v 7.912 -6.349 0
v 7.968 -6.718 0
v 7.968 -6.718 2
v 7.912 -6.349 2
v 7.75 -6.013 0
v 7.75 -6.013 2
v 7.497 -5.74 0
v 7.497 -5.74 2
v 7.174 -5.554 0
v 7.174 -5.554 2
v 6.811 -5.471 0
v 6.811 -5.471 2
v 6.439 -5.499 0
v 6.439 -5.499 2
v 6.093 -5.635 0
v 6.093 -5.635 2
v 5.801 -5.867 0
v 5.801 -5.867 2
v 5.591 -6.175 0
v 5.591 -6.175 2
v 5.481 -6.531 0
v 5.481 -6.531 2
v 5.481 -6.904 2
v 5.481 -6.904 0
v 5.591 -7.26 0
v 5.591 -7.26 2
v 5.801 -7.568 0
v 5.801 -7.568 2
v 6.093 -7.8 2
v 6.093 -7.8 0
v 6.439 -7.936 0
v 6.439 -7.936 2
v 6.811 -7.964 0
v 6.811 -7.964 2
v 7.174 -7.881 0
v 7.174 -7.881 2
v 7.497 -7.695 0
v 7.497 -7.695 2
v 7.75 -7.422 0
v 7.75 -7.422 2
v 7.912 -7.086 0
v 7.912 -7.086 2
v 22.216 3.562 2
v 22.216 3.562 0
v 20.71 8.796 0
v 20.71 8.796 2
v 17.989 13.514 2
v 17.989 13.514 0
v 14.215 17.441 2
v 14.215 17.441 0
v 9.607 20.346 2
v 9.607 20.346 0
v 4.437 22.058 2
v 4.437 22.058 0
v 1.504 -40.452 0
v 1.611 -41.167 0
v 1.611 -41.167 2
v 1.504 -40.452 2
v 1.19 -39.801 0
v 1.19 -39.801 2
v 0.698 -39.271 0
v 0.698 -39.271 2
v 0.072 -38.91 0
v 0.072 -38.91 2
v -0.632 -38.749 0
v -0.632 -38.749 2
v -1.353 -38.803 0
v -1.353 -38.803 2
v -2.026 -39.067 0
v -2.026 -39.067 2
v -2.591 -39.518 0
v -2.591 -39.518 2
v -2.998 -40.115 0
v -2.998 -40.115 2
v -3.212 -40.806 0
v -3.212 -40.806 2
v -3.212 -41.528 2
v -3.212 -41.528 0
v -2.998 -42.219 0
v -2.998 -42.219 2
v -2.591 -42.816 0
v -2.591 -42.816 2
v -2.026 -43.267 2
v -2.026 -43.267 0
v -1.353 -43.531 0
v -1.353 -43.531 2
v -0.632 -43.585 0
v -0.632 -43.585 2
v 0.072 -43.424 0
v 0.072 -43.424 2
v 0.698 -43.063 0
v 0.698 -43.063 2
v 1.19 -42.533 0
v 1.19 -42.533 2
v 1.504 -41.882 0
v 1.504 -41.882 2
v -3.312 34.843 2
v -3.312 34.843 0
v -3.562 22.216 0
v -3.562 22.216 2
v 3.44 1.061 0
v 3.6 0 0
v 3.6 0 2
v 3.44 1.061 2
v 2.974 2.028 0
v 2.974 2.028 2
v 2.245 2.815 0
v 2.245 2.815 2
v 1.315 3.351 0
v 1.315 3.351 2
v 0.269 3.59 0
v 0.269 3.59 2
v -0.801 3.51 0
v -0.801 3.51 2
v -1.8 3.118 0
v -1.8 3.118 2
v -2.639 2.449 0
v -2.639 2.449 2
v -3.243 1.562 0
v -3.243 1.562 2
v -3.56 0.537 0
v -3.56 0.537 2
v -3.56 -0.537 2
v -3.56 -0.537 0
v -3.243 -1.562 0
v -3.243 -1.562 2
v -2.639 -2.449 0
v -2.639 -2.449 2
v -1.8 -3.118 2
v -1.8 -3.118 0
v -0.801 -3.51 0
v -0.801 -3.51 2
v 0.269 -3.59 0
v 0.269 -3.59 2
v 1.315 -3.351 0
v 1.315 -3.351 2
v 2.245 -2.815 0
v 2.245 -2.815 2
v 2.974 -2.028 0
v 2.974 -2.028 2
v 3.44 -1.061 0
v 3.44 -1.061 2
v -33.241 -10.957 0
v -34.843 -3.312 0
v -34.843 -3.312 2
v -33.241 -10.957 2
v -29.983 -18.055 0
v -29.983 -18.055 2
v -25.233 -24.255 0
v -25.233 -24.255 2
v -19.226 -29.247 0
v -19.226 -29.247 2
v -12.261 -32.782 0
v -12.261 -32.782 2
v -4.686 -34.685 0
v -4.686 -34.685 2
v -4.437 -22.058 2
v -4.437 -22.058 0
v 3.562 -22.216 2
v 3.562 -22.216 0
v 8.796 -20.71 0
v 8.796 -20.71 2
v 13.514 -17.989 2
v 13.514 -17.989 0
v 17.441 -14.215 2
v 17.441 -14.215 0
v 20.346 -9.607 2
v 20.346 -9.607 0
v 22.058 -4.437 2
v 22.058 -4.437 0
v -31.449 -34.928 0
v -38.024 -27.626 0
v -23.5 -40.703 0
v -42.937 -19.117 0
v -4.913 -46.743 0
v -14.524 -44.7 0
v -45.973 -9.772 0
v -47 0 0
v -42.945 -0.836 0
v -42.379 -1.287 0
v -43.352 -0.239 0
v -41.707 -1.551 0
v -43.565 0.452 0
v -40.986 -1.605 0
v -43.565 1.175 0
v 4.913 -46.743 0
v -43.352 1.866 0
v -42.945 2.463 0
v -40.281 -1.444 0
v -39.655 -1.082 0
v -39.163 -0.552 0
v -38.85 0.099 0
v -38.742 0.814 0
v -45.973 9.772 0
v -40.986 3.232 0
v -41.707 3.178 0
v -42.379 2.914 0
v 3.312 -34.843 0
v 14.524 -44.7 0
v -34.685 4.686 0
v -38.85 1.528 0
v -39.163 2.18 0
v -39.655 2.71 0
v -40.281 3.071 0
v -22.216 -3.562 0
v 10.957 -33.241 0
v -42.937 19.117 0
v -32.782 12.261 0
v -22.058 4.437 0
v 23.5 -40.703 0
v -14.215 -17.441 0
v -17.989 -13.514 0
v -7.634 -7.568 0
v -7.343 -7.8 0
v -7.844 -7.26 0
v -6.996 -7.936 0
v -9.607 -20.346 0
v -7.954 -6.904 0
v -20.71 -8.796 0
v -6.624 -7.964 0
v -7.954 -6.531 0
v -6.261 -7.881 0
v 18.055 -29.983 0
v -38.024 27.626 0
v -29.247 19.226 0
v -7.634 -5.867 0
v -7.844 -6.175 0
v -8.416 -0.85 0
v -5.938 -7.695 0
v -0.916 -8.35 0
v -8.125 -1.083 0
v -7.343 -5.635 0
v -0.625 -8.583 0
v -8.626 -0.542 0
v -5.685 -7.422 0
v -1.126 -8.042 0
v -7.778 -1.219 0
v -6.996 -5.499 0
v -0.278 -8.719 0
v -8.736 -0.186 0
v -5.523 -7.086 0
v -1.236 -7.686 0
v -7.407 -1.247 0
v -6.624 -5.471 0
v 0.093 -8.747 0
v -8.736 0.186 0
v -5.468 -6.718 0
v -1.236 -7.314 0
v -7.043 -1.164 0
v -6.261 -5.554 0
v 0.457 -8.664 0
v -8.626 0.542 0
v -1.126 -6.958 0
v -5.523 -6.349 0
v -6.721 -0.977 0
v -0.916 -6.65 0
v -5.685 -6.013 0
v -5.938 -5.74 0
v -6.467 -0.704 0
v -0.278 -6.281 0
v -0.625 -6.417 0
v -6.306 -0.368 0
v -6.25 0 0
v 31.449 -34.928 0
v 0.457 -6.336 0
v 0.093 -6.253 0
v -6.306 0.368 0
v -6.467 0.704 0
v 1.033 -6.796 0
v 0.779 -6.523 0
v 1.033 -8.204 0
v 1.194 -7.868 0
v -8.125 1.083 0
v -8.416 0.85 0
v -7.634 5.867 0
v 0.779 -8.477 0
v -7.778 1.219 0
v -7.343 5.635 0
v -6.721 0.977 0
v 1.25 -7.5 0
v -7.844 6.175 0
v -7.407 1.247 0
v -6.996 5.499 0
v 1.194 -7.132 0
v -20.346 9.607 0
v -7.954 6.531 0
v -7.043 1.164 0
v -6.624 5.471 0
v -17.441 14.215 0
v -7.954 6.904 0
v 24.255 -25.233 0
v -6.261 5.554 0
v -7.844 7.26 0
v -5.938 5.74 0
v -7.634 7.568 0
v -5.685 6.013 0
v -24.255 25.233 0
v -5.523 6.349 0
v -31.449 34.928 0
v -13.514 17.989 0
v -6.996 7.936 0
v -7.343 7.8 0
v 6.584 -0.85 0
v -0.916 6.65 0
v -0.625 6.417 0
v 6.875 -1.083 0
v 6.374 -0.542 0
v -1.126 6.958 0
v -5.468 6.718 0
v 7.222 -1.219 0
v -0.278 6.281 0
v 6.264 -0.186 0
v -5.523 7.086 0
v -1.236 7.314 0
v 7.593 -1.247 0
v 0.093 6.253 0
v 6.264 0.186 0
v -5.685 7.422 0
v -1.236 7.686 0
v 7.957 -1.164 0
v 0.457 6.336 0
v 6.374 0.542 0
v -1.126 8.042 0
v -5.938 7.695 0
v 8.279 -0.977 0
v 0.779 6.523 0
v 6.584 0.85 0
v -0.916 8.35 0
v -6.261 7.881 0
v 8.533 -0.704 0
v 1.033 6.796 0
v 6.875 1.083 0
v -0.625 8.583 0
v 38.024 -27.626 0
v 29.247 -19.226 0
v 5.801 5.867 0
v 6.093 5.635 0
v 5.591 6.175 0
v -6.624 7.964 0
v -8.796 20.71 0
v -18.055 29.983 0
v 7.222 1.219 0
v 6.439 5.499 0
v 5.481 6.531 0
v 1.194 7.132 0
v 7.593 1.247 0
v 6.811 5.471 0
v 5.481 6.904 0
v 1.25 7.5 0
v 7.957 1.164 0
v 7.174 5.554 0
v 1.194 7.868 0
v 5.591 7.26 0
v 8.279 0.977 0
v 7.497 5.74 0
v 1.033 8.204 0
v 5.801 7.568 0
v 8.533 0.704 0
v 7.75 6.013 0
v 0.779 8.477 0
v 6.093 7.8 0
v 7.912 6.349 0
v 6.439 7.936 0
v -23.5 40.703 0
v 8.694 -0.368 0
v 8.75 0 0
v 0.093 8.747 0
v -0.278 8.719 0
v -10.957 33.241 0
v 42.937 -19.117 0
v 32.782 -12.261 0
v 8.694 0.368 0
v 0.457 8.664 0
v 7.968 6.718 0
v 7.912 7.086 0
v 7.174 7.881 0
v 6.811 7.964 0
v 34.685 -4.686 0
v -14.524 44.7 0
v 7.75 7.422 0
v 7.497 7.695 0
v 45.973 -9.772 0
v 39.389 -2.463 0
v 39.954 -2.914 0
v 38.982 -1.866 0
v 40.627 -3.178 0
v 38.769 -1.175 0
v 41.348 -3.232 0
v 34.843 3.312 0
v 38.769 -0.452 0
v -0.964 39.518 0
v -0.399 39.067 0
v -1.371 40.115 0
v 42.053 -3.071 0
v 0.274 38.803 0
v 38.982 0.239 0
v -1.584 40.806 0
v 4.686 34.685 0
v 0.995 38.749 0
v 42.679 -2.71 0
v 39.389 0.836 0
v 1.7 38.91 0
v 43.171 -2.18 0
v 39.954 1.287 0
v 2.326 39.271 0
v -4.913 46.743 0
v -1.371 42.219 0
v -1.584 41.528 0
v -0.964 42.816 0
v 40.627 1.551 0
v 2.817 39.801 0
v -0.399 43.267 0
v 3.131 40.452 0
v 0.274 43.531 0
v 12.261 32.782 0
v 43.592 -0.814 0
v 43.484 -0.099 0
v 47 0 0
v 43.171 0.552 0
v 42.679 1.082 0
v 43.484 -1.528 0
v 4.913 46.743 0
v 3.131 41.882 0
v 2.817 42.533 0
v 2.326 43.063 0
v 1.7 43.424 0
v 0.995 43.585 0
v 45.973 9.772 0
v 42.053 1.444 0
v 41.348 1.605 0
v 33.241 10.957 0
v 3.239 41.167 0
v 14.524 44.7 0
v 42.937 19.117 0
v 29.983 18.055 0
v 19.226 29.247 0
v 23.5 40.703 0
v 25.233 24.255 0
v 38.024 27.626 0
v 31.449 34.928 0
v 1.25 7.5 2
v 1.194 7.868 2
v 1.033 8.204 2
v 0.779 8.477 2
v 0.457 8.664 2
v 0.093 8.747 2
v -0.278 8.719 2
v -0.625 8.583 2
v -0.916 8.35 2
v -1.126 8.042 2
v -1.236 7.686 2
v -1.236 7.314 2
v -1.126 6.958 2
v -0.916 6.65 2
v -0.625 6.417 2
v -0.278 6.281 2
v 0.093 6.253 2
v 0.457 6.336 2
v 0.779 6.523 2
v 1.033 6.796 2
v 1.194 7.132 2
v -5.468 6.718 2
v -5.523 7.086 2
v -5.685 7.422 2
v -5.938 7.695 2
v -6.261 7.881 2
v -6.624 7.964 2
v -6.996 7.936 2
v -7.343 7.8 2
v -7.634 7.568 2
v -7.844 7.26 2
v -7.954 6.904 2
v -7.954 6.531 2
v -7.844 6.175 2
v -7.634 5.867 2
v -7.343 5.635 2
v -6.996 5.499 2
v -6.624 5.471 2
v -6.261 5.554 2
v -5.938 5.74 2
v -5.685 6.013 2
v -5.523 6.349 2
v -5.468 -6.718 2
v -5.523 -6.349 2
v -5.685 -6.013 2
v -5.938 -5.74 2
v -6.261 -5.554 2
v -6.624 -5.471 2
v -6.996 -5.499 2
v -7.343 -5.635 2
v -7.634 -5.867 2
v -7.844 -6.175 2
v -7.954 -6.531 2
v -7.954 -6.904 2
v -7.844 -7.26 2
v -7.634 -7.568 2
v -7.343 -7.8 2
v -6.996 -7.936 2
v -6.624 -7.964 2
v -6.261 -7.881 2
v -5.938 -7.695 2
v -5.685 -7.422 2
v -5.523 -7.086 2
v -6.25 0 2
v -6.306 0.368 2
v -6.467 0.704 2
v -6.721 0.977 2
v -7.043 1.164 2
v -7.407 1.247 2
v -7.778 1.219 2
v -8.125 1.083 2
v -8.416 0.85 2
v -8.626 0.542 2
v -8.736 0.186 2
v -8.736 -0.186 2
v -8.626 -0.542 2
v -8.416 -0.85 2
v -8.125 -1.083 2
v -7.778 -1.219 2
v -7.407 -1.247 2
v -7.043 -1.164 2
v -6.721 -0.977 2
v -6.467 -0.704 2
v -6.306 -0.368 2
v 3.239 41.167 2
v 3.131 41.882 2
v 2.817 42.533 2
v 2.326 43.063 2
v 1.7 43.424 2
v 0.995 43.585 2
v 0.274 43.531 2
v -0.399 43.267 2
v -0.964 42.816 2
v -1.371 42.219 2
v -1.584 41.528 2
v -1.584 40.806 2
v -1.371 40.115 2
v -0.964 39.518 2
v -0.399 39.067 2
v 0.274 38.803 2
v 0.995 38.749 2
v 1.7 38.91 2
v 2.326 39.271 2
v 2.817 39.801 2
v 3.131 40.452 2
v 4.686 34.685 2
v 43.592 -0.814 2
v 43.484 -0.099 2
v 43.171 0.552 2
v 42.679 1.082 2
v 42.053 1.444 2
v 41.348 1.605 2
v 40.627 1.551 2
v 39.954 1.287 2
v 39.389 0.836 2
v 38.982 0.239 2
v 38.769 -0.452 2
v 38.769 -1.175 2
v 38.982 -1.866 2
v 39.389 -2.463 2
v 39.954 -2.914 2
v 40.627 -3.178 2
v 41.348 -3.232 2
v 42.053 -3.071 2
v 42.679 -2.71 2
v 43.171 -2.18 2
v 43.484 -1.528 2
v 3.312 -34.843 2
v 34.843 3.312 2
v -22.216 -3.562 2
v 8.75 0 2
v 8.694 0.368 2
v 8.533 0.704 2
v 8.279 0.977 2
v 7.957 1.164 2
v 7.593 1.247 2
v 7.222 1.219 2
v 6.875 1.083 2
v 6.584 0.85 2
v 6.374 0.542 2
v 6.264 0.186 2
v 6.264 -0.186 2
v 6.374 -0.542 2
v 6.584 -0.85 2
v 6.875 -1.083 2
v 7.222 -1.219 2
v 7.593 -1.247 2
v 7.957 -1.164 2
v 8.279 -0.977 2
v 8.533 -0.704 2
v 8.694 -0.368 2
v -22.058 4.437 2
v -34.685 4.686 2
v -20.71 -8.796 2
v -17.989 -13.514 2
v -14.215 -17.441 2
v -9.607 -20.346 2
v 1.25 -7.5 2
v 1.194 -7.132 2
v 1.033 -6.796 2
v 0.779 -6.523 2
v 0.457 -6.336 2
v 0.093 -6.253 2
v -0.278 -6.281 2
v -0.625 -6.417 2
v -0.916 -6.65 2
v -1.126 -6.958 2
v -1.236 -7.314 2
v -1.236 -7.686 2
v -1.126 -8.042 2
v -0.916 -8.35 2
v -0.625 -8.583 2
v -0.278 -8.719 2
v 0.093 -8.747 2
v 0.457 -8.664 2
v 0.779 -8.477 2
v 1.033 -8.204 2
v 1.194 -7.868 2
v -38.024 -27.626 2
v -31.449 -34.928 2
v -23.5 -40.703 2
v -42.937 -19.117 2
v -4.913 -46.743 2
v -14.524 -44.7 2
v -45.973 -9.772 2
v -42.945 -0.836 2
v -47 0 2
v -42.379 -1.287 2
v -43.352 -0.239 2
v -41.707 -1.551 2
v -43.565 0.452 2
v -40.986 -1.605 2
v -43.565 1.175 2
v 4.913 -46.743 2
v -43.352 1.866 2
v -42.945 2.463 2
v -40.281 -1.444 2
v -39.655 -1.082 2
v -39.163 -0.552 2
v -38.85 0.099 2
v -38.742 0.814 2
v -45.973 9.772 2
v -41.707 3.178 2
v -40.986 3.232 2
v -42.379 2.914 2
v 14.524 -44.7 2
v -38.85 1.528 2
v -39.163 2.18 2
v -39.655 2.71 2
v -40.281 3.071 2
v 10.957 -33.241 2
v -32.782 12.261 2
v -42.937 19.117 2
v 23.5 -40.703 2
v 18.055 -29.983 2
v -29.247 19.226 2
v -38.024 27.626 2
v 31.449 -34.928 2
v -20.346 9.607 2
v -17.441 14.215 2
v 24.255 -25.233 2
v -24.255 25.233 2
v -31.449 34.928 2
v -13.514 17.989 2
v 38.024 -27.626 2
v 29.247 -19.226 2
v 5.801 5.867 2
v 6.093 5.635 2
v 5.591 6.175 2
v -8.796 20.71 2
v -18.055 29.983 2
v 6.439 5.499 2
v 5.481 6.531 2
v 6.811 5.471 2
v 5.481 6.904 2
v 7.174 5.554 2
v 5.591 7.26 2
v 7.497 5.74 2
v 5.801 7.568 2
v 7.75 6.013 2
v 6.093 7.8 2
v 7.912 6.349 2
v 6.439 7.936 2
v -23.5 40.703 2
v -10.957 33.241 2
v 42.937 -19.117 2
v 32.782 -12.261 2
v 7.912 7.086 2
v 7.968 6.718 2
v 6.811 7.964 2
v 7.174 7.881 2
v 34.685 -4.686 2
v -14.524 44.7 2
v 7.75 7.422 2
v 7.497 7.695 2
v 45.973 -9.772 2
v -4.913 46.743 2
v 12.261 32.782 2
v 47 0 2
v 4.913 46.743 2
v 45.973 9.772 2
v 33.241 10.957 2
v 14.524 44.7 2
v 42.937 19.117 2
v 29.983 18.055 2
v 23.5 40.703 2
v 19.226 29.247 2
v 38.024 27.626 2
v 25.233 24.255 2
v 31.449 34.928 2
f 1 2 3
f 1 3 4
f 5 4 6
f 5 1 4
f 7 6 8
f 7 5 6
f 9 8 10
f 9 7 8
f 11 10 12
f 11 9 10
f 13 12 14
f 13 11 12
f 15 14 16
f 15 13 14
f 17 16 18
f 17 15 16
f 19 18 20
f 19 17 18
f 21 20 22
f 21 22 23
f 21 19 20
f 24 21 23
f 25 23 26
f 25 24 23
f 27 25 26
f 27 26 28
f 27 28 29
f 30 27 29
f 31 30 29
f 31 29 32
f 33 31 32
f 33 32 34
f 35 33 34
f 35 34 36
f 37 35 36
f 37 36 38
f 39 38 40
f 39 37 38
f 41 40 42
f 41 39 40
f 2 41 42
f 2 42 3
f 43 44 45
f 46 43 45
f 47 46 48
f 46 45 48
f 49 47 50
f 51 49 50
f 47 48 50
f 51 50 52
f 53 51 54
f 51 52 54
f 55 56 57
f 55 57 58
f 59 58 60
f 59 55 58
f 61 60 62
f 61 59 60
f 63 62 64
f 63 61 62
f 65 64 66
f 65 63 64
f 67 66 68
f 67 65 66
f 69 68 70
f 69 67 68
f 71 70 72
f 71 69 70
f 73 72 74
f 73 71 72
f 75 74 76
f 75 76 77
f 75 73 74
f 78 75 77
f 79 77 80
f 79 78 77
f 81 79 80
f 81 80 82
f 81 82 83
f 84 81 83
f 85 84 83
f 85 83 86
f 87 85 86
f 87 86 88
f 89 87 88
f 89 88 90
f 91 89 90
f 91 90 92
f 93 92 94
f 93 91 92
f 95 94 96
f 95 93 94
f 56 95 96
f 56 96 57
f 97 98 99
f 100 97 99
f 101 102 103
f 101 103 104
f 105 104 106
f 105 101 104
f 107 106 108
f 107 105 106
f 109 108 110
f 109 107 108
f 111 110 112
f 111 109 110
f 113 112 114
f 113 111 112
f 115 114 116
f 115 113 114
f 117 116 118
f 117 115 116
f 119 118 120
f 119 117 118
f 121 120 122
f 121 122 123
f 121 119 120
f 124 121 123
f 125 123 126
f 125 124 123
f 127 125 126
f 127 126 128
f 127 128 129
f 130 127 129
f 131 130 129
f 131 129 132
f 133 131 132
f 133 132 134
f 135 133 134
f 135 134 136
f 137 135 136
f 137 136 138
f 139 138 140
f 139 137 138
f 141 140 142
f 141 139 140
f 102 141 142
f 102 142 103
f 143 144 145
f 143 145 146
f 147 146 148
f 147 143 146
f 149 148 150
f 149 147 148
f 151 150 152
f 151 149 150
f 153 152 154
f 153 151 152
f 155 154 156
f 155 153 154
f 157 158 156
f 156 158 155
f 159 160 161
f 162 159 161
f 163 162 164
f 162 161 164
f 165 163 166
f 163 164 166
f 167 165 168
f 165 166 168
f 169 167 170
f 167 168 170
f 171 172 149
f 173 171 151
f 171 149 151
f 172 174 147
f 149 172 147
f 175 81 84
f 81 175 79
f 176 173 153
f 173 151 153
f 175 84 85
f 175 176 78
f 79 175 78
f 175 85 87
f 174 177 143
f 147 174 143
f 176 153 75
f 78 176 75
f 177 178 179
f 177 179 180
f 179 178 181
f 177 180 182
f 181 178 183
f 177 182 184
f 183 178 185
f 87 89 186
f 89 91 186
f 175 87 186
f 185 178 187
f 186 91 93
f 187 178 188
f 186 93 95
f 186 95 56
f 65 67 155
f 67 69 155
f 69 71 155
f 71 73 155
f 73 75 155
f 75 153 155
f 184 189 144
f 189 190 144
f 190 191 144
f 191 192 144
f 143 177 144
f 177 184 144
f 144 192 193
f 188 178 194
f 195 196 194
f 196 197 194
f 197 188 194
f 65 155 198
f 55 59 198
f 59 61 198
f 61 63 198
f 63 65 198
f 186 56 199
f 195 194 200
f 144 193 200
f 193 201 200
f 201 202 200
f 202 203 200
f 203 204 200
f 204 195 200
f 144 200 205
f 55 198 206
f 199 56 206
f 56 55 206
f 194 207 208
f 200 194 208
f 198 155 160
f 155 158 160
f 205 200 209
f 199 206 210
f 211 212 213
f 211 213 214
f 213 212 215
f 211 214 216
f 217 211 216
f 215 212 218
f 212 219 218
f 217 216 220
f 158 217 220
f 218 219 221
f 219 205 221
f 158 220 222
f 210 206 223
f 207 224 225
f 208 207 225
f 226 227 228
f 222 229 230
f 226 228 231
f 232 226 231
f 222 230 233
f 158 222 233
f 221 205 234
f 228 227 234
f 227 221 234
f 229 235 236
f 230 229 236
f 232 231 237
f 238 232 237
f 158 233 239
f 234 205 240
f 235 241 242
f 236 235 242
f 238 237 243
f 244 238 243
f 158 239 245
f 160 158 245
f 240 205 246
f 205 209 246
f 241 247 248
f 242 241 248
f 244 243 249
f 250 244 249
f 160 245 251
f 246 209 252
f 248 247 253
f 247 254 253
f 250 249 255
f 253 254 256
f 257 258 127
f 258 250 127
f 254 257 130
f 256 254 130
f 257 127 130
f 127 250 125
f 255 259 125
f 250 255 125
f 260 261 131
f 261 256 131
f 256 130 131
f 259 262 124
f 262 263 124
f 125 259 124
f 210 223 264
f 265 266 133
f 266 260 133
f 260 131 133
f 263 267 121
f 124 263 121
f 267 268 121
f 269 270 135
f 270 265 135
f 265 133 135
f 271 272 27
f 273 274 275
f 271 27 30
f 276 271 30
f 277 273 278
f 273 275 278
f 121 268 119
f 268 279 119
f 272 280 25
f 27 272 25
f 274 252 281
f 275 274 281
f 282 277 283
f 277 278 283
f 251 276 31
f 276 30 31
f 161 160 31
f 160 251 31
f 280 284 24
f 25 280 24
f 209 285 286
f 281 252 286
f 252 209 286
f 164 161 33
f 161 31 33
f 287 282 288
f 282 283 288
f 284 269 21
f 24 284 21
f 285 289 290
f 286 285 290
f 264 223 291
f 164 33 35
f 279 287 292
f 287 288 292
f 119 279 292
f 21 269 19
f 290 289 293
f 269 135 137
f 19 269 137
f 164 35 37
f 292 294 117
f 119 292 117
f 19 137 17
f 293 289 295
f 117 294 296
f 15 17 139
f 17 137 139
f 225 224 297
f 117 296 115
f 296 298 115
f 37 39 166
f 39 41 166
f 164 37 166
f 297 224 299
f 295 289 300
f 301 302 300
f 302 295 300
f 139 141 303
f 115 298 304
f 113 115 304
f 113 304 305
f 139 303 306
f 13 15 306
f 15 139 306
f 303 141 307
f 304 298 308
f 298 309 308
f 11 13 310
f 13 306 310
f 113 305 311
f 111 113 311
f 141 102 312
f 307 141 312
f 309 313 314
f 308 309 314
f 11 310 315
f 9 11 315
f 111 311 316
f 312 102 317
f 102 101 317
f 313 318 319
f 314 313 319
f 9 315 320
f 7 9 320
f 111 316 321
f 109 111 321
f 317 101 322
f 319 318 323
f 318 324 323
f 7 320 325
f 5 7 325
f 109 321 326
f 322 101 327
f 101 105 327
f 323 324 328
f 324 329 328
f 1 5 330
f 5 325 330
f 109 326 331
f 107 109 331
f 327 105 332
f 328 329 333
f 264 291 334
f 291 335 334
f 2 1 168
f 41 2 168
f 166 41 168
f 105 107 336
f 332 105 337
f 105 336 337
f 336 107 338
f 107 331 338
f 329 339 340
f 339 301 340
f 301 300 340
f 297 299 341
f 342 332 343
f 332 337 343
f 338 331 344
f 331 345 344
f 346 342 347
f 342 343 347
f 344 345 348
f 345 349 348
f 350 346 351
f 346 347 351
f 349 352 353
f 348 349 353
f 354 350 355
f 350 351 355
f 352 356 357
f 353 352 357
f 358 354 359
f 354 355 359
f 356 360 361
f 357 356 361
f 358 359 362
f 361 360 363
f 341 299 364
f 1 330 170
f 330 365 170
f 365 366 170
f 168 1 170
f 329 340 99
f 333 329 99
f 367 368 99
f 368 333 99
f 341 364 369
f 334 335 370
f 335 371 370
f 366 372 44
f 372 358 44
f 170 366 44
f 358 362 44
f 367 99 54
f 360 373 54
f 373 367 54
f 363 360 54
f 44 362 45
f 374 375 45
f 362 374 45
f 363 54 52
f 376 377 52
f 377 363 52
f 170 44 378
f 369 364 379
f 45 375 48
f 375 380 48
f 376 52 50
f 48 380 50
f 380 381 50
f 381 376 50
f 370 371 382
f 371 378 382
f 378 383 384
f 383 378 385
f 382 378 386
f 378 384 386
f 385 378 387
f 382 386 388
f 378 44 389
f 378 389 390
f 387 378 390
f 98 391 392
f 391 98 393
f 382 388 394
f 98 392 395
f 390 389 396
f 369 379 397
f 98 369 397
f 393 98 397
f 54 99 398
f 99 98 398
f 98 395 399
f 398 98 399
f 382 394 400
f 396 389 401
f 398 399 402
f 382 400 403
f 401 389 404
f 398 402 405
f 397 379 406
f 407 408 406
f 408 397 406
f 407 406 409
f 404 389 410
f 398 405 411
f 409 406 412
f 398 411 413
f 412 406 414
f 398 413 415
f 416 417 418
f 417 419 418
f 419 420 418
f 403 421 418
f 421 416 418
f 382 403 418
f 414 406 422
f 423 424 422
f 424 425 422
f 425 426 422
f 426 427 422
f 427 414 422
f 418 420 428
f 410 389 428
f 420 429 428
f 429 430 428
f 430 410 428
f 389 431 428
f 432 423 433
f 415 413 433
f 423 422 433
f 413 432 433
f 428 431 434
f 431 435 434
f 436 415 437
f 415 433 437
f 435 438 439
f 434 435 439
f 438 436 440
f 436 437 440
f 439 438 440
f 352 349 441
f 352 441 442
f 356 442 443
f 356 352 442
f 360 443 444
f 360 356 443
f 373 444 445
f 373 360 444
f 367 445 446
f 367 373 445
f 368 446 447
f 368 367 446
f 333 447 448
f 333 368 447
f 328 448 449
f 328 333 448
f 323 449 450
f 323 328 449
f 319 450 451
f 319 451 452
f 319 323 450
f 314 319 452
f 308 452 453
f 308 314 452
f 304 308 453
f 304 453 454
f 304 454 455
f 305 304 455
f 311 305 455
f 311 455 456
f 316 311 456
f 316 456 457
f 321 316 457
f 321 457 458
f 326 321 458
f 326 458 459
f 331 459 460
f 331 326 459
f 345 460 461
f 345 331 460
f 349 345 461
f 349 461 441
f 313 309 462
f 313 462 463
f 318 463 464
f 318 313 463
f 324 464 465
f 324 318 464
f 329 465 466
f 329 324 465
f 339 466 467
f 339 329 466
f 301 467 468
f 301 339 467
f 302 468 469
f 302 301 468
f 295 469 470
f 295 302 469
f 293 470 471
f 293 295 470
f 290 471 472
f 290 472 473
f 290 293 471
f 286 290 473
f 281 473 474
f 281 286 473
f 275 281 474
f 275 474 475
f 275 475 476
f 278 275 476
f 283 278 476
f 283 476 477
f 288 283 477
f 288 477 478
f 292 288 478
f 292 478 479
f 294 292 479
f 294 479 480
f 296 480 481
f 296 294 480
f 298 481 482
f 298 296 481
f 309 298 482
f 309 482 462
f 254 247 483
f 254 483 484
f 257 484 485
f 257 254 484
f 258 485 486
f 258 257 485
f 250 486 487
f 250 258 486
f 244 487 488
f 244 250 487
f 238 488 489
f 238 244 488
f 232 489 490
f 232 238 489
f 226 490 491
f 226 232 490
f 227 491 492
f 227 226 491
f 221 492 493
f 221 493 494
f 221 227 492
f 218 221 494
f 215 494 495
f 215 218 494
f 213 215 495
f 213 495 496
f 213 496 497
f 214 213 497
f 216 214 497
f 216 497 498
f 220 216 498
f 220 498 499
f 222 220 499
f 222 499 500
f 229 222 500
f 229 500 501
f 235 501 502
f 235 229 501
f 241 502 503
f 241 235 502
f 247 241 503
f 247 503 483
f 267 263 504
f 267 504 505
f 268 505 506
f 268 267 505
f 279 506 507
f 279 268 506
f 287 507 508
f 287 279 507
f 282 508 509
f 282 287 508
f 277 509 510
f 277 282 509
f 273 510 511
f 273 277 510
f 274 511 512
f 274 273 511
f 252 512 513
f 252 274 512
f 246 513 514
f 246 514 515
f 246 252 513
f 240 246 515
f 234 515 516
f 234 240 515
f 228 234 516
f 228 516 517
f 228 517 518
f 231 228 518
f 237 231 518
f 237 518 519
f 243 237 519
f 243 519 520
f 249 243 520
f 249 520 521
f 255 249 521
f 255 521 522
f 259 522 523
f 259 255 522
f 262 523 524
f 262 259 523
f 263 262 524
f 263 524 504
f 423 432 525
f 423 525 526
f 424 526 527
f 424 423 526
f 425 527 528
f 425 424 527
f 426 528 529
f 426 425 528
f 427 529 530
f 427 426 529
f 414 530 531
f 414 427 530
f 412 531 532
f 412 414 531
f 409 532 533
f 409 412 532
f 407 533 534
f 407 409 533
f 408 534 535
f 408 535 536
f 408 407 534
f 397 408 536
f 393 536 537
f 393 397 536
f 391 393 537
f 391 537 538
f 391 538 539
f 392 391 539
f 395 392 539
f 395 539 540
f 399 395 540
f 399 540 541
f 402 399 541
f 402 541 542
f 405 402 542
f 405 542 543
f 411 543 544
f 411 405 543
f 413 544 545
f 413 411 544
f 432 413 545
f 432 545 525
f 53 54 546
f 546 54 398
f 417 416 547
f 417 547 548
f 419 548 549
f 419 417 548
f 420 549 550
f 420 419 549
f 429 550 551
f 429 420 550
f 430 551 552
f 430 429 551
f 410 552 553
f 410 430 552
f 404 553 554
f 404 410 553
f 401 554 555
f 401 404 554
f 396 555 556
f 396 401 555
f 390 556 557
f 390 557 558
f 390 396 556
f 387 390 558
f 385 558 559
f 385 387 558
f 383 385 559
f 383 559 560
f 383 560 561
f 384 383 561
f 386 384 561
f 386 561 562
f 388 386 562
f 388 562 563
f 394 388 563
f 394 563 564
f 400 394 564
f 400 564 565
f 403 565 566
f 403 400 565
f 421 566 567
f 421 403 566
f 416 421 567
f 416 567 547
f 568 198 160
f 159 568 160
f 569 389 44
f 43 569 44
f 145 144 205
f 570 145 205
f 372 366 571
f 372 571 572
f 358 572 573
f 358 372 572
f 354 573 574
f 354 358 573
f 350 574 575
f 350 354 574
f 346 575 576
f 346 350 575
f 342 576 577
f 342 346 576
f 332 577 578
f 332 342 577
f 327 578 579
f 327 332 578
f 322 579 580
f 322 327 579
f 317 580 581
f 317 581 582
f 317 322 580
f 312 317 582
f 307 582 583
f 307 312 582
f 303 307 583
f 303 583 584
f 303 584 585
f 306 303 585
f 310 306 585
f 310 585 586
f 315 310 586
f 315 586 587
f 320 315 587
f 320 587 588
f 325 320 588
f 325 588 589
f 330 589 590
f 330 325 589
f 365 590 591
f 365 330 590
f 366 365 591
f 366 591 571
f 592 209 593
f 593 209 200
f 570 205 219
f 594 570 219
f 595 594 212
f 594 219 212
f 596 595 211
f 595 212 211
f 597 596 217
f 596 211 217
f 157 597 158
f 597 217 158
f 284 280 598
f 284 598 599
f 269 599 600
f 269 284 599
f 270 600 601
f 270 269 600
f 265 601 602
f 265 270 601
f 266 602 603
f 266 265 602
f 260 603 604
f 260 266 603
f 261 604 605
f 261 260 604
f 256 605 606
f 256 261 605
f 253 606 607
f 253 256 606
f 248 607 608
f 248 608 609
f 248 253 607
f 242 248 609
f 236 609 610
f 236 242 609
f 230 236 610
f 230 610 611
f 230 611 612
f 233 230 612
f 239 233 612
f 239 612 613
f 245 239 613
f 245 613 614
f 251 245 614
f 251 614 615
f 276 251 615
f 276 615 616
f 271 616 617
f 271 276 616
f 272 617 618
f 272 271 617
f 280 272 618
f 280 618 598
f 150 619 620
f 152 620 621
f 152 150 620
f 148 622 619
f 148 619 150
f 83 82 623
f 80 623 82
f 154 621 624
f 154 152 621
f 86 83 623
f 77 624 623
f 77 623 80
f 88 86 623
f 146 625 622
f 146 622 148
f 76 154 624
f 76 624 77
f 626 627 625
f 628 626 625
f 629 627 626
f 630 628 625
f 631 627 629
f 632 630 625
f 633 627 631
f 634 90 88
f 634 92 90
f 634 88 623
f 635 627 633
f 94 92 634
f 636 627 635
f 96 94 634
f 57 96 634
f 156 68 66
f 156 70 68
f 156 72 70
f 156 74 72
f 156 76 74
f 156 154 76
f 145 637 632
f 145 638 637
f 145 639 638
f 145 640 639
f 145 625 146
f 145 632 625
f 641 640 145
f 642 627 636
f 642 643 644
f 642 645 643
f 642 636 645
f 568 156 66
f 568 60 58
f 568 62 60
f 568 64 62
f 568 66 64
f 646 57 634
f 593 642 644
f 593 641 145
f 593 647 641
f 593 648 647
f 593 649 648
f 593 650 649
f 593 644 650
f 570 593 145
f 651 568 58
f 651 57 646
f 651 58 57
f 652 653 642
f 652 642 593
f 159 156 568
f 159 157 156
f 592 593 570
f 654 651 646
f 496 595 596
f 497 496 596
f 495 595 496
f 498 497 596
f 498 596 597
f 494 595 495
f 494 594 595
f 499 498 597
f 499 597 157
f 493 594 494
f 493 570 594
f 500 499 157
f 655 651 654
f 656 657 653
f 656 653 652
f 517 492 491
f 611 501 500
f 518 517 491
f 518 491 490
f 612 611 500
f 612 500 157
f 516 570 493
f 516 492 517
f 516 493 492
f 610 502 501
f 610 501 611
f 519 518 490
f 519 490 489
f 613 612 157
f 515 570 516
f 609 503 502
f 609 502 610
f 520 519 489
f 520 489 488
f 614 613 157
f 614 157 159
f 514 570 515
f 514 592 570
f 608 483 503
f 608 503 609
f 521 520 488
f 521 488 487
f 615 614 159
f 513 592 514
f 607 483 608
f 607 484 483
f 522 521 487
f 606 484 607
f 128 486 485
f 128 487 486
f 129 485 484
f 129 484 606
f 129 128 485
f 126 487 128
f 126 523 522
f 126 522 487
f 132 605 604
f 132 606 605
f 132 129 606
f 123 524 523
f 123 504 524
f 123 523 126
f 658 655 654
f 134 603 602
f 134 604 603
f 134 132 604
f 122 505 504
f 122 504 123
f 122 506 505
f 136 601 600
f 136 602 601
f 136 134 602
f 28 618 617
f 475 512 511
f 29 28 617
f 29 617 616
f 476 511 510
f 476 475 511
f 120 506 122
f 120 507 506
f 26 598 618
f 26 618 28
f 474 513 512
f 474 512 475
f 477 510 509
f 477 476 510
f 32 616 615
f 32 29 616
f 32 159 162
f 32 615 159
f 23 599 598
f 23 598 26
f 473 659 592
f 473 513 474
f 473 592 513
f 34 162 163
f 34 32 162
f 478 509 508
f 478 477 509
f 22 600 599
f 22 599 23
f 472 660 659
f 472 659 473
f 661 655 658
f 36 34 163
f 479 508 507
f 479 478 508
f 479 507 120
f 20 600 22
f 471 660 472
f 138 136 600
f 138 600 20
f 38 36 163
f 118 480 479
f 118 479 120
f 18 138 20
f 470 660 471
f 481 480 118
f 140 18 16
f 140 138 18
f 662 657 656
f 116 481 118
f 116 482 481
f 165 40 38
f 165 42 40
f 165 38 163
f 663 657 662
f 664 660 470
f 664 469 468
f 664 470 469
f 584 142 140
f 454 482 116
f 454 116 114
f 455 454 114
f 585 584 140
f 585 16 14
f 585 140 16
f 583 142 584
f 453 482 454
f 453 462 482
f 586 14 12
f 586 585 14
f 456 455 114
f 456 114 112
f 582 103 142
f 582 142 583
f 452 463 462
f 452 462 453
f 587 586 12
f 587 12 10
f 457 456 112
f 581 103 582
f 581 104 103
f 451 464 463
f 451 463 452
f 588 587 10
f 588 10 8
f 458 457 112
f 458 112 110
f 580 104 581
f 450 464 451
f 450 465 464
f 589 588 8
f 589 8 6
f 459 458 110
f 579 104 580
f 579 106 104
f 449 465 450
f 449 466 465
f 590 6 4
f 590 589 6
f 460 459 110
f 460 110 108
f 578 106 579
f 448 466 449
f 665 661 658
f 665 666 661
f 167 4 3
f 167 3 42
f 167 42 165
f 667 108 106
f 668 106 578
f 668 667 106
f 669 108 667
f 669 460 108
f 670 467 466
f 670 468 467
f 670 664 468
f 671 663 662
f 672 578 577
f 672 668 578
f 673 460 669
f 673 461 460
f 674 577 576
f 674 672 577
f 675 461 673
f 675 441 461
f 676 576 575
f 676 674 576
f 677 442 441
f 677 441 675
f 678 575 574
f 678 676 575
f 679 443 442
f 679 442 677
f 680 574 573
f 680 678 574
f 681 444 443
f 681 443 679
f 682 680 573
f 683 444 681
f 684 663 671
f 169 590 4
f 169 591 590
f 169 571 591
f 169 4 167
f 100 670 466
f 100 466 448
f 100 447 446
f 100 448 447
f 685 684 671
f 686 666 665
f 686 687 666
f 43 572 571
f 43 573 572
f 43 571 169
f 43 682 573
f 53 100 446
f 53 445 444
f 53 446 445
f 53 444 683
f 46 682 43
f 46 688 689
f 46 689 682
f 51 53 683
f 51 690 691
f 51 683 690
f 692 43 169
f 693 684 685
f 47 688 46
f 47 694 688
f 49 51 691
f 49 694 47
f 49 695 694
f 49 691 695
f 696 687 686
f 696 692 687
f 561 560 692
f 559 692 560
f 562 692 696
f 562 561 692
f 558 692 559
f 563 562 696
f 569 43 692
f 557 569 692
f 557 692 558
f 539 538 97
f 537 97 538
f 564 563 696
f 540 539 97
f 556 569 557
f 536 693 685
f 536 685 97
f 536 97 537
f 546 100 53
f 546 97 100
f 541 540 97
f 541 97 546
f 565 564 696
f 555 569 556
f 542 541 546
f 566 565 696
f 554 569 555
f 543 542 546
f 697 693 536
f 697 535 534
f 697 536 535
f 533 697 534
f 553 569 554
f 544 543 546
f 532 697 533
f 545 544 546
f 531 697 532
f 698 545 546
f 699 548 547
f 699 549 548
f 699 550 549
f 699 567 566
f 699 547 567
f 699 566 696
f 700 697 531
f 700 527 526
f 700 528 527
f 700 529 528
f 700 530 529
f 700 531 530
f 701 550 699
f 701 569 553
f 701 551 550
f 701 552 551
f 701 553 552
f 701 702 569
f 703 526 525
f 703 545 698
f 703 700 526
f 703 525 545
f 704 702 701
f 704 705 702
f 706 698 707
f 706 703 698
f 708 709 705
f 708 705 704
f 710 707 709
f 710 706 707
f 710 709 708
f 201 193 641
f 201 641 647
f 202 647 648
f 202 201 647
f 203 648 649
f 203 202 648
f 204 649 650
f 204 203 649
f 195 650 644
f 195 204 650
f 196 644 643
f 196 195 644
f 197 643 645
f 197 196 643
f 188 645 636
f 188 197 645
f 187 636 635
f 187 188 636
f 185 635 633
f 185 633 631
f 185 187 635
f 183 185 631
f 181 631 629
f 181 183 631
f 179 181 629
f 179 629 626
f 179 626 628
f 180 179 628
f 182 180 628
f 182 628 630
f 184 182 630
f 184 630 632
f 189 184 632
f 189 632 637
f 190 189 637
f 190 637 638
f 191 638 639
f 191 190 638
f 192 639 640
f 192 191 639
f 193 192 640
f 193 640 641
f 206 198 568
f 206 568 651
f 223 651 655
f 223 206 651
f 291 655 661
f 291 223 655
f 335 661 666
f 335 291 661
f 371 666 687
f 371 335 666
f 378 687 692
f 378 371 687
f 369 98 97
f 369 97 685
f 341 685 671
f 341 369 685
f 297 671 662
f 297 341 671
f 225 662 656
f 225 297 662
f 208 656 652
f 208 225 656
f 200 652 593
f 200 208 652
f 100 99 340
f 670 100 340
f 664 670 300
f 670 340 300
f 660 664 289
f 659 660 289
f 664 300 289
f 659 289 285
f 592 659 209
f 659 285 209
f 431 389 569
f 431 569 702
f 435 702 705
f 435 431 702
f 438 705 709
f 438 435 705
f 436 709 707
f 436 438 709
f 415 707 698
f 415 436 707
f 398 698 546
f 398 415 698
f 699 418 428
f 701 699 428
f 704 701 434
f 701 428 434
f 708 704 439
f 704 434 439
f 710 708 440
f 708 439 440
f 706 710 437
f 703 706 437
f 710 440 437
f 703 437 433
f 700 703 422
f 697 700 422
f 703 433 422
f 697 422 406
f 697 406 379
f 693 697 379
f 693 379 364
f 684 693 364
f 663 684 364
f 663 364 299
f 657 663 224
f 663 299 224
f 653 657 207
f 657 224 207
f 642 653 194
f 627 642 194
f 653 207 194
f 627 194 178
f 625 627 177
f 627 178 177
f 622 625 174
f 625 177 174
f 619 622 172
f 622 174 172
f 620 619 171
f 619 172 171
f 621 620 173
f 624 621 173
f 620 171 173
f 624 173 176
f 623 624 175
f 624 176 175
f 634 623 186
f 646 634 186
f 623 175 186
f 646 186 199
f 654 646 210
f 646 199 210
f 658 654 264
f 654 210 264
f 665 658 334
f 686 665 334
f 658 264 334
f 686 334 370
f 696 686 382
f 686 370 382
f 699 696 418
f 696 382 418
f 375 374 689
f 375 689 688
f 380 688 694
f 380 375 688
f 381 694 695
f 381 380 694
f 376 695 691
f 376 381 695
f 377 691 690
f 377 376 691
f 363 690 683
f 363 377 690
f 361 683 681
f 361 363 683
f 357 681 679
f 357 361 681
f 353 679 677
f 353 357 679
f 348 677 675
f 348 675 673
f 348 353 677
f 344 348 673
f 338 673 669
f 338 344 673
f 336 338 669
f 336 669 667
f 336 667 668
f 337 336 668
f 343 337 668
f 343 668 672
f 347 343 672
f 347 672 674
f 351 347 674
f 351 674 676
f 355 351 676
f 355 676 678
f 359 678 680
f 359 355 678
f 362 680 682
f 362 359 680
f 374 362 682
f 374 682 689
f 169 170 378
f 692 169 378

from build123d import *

# Parameters (mm, degrees)
SKETCH_2_R      = 47
SKETCH_2_R_2    = 2.425
SKETCH_2_R_3    = 35
SKETCH_2_R_4    = 22.5
SKETCH_2_R_5    = 1.25
SKETCH_2_R_6    = 3.6
EXTRUDE_1_DEPTH = 2


with BuildPart() as part:
    # 草图2 → 凸台-拉伸1 (new body)
    # profile 1 of 6: a face of its own
    with BuildSketch(Plane.XY):
        Circle(SKETCH_2_R)
        with Locations((-0.813609012, -41.166960847)):
            Circle(SKETCH_2_R_2, mode=Mode.SUBTRACT)
        Circle(SKETCH_2_R_3, mode=Mode.SUBTRACT)
        with Locations((0.813609012, 41.166960847)):
            Circle(SKETCH_2_R_2, mode=Mode.SUBTRACT)
        with Locations((41.166960847, -0.813609012)):
            Circle(SKETCH_2_R_2, mode=Mode.SUBTRACT)
        with Locations((-41.166960847, 0.813609012)):
            Circle(SKETCH_2_R_2, mode=Mode.SUBTRACT)
    # profile 2 of 6: a face of its own
    with BuildSketch(Plane.XY):
        with BuildLine():
            Line((-34.842927678, -3.312158032), (-22.21630595, -3.561706044))
            ThreePointArc((-22.21630595, -3.561706044), (-22.49560702, 0.444595088), (-22.058227696, 4.436732007))
            Line((-22.058227696, 4.436732007), (-34.684849424, 4.686280019))
            ThreePointArc((-34.684849424, 4.686280019), (-34.993166476, 0.69159236), (-34.842927678, -3.312158032))
        make_face()
    # profile 3 of 6: a face of its own
    with BuildSketch(Plane.XY):
        with BuildLine():
            Line((3.312158032, -34.842927678), (3.561706044, -22.21630595))
            ThreePointArc((3.561706044, -22.21630595), (-0.444595088, -22.49560702), (-4.436732007, -22.058227696))
            Line((-4.436732007, -22.058227696), (-4.686280019, -34.684849424))
            ThreePointArc((-4.686280019, -34.684849424), (-0.69159236, -34.993166476), (3.312158032, -34.842927678))
        make_face()
    # profile 4 of 6: a face of its own
    with BuildSketch(Plane.XY):
        with BuildLine():
            ThreePointArc((22.5, 0), (22.389284526, -2.229335869), (22.058227696, -4.436732007))
            Line((22.058227696, -4.436732007), (34.684849424, -4.686280019))
            ThreePointArc((34.684849424, -4.686280019), (34.921123477, -2.348432472), (35, 0))
            ThreePointArc((35, 0), (34.960709866, 1.657940179), (34.842927678, 3.312158032))
            Line((34.842927678, 3.312158032), (22.21630595, 3.561706044))
            ThreePointArc((22.21630595, 3.561706044), (22.428964353, 1.786493231), (22.5, 0))
        make_face()
    # profile 5 of 6: a face of its own
    with BuildSketch(Plane.XY):
        with BuildLine():
            Line((-3.312158032, 34.842927678), (-3.561706044, 22.21630595))
            ThreePointArc((-3.561706044, 22.21630595), (0.444595088, 22.49560702), (4.436732007, 22.058227696))
            Line((4.436732007, 22.058227696), (4.686280019, 34.684849424))
            ThreePointArc((4.686280019, 34.684849424), (0.69159236, 34.993166476), (-3.312158032, 34.842927678))
        make_face()
    # profile 6 of 6: a face of its own
    with BuildSketch(Plane.XY):
        Circle(SKETCH_2_R_4)
        with Locations((7.5, 0)):
            Circle(SKETCH_2_R_5, mode=Mode.SUBTRACT)
        with Locations((0, 7.5)):
            Circle(SKETCH_2_R_5, mode=Mode.SUBTRACT)
        with Locations((0, -7.5)):
            Circle(SKETCH_2_R_5, mode=Mode.SUBTRACT)
        with Locations((-6.717514421, 6.717514421)):
            Circle(SKETCH_2_R_5, mode=Mode.SUBTRACT)
        with Locations((-6.717514421, -6.717514421)):
            Circle(SKETCH_2_R_5, mode=Mode.SUBTRACT)
        with Locations((6.717514421, -6.717514421)):
            Circle(SKETCH_2_R_5, mode=Mode.SUBTRACT)
        with Locations((-7.5, 0)):
            Circle(SKETCH_2_R_5, mode=Mode.SUBTRACT)
        with Locations((6.717514421, 6.717514421)):
            Circle(SKETCH_2_R_5, mode=Mode.SUBTRACT)
        Circle(SKETCH_2_R_6, mode=Mode.SUBTRACT)
    extrude(amount=EXTRUDE_1_DEPTH)


solid = part.part
